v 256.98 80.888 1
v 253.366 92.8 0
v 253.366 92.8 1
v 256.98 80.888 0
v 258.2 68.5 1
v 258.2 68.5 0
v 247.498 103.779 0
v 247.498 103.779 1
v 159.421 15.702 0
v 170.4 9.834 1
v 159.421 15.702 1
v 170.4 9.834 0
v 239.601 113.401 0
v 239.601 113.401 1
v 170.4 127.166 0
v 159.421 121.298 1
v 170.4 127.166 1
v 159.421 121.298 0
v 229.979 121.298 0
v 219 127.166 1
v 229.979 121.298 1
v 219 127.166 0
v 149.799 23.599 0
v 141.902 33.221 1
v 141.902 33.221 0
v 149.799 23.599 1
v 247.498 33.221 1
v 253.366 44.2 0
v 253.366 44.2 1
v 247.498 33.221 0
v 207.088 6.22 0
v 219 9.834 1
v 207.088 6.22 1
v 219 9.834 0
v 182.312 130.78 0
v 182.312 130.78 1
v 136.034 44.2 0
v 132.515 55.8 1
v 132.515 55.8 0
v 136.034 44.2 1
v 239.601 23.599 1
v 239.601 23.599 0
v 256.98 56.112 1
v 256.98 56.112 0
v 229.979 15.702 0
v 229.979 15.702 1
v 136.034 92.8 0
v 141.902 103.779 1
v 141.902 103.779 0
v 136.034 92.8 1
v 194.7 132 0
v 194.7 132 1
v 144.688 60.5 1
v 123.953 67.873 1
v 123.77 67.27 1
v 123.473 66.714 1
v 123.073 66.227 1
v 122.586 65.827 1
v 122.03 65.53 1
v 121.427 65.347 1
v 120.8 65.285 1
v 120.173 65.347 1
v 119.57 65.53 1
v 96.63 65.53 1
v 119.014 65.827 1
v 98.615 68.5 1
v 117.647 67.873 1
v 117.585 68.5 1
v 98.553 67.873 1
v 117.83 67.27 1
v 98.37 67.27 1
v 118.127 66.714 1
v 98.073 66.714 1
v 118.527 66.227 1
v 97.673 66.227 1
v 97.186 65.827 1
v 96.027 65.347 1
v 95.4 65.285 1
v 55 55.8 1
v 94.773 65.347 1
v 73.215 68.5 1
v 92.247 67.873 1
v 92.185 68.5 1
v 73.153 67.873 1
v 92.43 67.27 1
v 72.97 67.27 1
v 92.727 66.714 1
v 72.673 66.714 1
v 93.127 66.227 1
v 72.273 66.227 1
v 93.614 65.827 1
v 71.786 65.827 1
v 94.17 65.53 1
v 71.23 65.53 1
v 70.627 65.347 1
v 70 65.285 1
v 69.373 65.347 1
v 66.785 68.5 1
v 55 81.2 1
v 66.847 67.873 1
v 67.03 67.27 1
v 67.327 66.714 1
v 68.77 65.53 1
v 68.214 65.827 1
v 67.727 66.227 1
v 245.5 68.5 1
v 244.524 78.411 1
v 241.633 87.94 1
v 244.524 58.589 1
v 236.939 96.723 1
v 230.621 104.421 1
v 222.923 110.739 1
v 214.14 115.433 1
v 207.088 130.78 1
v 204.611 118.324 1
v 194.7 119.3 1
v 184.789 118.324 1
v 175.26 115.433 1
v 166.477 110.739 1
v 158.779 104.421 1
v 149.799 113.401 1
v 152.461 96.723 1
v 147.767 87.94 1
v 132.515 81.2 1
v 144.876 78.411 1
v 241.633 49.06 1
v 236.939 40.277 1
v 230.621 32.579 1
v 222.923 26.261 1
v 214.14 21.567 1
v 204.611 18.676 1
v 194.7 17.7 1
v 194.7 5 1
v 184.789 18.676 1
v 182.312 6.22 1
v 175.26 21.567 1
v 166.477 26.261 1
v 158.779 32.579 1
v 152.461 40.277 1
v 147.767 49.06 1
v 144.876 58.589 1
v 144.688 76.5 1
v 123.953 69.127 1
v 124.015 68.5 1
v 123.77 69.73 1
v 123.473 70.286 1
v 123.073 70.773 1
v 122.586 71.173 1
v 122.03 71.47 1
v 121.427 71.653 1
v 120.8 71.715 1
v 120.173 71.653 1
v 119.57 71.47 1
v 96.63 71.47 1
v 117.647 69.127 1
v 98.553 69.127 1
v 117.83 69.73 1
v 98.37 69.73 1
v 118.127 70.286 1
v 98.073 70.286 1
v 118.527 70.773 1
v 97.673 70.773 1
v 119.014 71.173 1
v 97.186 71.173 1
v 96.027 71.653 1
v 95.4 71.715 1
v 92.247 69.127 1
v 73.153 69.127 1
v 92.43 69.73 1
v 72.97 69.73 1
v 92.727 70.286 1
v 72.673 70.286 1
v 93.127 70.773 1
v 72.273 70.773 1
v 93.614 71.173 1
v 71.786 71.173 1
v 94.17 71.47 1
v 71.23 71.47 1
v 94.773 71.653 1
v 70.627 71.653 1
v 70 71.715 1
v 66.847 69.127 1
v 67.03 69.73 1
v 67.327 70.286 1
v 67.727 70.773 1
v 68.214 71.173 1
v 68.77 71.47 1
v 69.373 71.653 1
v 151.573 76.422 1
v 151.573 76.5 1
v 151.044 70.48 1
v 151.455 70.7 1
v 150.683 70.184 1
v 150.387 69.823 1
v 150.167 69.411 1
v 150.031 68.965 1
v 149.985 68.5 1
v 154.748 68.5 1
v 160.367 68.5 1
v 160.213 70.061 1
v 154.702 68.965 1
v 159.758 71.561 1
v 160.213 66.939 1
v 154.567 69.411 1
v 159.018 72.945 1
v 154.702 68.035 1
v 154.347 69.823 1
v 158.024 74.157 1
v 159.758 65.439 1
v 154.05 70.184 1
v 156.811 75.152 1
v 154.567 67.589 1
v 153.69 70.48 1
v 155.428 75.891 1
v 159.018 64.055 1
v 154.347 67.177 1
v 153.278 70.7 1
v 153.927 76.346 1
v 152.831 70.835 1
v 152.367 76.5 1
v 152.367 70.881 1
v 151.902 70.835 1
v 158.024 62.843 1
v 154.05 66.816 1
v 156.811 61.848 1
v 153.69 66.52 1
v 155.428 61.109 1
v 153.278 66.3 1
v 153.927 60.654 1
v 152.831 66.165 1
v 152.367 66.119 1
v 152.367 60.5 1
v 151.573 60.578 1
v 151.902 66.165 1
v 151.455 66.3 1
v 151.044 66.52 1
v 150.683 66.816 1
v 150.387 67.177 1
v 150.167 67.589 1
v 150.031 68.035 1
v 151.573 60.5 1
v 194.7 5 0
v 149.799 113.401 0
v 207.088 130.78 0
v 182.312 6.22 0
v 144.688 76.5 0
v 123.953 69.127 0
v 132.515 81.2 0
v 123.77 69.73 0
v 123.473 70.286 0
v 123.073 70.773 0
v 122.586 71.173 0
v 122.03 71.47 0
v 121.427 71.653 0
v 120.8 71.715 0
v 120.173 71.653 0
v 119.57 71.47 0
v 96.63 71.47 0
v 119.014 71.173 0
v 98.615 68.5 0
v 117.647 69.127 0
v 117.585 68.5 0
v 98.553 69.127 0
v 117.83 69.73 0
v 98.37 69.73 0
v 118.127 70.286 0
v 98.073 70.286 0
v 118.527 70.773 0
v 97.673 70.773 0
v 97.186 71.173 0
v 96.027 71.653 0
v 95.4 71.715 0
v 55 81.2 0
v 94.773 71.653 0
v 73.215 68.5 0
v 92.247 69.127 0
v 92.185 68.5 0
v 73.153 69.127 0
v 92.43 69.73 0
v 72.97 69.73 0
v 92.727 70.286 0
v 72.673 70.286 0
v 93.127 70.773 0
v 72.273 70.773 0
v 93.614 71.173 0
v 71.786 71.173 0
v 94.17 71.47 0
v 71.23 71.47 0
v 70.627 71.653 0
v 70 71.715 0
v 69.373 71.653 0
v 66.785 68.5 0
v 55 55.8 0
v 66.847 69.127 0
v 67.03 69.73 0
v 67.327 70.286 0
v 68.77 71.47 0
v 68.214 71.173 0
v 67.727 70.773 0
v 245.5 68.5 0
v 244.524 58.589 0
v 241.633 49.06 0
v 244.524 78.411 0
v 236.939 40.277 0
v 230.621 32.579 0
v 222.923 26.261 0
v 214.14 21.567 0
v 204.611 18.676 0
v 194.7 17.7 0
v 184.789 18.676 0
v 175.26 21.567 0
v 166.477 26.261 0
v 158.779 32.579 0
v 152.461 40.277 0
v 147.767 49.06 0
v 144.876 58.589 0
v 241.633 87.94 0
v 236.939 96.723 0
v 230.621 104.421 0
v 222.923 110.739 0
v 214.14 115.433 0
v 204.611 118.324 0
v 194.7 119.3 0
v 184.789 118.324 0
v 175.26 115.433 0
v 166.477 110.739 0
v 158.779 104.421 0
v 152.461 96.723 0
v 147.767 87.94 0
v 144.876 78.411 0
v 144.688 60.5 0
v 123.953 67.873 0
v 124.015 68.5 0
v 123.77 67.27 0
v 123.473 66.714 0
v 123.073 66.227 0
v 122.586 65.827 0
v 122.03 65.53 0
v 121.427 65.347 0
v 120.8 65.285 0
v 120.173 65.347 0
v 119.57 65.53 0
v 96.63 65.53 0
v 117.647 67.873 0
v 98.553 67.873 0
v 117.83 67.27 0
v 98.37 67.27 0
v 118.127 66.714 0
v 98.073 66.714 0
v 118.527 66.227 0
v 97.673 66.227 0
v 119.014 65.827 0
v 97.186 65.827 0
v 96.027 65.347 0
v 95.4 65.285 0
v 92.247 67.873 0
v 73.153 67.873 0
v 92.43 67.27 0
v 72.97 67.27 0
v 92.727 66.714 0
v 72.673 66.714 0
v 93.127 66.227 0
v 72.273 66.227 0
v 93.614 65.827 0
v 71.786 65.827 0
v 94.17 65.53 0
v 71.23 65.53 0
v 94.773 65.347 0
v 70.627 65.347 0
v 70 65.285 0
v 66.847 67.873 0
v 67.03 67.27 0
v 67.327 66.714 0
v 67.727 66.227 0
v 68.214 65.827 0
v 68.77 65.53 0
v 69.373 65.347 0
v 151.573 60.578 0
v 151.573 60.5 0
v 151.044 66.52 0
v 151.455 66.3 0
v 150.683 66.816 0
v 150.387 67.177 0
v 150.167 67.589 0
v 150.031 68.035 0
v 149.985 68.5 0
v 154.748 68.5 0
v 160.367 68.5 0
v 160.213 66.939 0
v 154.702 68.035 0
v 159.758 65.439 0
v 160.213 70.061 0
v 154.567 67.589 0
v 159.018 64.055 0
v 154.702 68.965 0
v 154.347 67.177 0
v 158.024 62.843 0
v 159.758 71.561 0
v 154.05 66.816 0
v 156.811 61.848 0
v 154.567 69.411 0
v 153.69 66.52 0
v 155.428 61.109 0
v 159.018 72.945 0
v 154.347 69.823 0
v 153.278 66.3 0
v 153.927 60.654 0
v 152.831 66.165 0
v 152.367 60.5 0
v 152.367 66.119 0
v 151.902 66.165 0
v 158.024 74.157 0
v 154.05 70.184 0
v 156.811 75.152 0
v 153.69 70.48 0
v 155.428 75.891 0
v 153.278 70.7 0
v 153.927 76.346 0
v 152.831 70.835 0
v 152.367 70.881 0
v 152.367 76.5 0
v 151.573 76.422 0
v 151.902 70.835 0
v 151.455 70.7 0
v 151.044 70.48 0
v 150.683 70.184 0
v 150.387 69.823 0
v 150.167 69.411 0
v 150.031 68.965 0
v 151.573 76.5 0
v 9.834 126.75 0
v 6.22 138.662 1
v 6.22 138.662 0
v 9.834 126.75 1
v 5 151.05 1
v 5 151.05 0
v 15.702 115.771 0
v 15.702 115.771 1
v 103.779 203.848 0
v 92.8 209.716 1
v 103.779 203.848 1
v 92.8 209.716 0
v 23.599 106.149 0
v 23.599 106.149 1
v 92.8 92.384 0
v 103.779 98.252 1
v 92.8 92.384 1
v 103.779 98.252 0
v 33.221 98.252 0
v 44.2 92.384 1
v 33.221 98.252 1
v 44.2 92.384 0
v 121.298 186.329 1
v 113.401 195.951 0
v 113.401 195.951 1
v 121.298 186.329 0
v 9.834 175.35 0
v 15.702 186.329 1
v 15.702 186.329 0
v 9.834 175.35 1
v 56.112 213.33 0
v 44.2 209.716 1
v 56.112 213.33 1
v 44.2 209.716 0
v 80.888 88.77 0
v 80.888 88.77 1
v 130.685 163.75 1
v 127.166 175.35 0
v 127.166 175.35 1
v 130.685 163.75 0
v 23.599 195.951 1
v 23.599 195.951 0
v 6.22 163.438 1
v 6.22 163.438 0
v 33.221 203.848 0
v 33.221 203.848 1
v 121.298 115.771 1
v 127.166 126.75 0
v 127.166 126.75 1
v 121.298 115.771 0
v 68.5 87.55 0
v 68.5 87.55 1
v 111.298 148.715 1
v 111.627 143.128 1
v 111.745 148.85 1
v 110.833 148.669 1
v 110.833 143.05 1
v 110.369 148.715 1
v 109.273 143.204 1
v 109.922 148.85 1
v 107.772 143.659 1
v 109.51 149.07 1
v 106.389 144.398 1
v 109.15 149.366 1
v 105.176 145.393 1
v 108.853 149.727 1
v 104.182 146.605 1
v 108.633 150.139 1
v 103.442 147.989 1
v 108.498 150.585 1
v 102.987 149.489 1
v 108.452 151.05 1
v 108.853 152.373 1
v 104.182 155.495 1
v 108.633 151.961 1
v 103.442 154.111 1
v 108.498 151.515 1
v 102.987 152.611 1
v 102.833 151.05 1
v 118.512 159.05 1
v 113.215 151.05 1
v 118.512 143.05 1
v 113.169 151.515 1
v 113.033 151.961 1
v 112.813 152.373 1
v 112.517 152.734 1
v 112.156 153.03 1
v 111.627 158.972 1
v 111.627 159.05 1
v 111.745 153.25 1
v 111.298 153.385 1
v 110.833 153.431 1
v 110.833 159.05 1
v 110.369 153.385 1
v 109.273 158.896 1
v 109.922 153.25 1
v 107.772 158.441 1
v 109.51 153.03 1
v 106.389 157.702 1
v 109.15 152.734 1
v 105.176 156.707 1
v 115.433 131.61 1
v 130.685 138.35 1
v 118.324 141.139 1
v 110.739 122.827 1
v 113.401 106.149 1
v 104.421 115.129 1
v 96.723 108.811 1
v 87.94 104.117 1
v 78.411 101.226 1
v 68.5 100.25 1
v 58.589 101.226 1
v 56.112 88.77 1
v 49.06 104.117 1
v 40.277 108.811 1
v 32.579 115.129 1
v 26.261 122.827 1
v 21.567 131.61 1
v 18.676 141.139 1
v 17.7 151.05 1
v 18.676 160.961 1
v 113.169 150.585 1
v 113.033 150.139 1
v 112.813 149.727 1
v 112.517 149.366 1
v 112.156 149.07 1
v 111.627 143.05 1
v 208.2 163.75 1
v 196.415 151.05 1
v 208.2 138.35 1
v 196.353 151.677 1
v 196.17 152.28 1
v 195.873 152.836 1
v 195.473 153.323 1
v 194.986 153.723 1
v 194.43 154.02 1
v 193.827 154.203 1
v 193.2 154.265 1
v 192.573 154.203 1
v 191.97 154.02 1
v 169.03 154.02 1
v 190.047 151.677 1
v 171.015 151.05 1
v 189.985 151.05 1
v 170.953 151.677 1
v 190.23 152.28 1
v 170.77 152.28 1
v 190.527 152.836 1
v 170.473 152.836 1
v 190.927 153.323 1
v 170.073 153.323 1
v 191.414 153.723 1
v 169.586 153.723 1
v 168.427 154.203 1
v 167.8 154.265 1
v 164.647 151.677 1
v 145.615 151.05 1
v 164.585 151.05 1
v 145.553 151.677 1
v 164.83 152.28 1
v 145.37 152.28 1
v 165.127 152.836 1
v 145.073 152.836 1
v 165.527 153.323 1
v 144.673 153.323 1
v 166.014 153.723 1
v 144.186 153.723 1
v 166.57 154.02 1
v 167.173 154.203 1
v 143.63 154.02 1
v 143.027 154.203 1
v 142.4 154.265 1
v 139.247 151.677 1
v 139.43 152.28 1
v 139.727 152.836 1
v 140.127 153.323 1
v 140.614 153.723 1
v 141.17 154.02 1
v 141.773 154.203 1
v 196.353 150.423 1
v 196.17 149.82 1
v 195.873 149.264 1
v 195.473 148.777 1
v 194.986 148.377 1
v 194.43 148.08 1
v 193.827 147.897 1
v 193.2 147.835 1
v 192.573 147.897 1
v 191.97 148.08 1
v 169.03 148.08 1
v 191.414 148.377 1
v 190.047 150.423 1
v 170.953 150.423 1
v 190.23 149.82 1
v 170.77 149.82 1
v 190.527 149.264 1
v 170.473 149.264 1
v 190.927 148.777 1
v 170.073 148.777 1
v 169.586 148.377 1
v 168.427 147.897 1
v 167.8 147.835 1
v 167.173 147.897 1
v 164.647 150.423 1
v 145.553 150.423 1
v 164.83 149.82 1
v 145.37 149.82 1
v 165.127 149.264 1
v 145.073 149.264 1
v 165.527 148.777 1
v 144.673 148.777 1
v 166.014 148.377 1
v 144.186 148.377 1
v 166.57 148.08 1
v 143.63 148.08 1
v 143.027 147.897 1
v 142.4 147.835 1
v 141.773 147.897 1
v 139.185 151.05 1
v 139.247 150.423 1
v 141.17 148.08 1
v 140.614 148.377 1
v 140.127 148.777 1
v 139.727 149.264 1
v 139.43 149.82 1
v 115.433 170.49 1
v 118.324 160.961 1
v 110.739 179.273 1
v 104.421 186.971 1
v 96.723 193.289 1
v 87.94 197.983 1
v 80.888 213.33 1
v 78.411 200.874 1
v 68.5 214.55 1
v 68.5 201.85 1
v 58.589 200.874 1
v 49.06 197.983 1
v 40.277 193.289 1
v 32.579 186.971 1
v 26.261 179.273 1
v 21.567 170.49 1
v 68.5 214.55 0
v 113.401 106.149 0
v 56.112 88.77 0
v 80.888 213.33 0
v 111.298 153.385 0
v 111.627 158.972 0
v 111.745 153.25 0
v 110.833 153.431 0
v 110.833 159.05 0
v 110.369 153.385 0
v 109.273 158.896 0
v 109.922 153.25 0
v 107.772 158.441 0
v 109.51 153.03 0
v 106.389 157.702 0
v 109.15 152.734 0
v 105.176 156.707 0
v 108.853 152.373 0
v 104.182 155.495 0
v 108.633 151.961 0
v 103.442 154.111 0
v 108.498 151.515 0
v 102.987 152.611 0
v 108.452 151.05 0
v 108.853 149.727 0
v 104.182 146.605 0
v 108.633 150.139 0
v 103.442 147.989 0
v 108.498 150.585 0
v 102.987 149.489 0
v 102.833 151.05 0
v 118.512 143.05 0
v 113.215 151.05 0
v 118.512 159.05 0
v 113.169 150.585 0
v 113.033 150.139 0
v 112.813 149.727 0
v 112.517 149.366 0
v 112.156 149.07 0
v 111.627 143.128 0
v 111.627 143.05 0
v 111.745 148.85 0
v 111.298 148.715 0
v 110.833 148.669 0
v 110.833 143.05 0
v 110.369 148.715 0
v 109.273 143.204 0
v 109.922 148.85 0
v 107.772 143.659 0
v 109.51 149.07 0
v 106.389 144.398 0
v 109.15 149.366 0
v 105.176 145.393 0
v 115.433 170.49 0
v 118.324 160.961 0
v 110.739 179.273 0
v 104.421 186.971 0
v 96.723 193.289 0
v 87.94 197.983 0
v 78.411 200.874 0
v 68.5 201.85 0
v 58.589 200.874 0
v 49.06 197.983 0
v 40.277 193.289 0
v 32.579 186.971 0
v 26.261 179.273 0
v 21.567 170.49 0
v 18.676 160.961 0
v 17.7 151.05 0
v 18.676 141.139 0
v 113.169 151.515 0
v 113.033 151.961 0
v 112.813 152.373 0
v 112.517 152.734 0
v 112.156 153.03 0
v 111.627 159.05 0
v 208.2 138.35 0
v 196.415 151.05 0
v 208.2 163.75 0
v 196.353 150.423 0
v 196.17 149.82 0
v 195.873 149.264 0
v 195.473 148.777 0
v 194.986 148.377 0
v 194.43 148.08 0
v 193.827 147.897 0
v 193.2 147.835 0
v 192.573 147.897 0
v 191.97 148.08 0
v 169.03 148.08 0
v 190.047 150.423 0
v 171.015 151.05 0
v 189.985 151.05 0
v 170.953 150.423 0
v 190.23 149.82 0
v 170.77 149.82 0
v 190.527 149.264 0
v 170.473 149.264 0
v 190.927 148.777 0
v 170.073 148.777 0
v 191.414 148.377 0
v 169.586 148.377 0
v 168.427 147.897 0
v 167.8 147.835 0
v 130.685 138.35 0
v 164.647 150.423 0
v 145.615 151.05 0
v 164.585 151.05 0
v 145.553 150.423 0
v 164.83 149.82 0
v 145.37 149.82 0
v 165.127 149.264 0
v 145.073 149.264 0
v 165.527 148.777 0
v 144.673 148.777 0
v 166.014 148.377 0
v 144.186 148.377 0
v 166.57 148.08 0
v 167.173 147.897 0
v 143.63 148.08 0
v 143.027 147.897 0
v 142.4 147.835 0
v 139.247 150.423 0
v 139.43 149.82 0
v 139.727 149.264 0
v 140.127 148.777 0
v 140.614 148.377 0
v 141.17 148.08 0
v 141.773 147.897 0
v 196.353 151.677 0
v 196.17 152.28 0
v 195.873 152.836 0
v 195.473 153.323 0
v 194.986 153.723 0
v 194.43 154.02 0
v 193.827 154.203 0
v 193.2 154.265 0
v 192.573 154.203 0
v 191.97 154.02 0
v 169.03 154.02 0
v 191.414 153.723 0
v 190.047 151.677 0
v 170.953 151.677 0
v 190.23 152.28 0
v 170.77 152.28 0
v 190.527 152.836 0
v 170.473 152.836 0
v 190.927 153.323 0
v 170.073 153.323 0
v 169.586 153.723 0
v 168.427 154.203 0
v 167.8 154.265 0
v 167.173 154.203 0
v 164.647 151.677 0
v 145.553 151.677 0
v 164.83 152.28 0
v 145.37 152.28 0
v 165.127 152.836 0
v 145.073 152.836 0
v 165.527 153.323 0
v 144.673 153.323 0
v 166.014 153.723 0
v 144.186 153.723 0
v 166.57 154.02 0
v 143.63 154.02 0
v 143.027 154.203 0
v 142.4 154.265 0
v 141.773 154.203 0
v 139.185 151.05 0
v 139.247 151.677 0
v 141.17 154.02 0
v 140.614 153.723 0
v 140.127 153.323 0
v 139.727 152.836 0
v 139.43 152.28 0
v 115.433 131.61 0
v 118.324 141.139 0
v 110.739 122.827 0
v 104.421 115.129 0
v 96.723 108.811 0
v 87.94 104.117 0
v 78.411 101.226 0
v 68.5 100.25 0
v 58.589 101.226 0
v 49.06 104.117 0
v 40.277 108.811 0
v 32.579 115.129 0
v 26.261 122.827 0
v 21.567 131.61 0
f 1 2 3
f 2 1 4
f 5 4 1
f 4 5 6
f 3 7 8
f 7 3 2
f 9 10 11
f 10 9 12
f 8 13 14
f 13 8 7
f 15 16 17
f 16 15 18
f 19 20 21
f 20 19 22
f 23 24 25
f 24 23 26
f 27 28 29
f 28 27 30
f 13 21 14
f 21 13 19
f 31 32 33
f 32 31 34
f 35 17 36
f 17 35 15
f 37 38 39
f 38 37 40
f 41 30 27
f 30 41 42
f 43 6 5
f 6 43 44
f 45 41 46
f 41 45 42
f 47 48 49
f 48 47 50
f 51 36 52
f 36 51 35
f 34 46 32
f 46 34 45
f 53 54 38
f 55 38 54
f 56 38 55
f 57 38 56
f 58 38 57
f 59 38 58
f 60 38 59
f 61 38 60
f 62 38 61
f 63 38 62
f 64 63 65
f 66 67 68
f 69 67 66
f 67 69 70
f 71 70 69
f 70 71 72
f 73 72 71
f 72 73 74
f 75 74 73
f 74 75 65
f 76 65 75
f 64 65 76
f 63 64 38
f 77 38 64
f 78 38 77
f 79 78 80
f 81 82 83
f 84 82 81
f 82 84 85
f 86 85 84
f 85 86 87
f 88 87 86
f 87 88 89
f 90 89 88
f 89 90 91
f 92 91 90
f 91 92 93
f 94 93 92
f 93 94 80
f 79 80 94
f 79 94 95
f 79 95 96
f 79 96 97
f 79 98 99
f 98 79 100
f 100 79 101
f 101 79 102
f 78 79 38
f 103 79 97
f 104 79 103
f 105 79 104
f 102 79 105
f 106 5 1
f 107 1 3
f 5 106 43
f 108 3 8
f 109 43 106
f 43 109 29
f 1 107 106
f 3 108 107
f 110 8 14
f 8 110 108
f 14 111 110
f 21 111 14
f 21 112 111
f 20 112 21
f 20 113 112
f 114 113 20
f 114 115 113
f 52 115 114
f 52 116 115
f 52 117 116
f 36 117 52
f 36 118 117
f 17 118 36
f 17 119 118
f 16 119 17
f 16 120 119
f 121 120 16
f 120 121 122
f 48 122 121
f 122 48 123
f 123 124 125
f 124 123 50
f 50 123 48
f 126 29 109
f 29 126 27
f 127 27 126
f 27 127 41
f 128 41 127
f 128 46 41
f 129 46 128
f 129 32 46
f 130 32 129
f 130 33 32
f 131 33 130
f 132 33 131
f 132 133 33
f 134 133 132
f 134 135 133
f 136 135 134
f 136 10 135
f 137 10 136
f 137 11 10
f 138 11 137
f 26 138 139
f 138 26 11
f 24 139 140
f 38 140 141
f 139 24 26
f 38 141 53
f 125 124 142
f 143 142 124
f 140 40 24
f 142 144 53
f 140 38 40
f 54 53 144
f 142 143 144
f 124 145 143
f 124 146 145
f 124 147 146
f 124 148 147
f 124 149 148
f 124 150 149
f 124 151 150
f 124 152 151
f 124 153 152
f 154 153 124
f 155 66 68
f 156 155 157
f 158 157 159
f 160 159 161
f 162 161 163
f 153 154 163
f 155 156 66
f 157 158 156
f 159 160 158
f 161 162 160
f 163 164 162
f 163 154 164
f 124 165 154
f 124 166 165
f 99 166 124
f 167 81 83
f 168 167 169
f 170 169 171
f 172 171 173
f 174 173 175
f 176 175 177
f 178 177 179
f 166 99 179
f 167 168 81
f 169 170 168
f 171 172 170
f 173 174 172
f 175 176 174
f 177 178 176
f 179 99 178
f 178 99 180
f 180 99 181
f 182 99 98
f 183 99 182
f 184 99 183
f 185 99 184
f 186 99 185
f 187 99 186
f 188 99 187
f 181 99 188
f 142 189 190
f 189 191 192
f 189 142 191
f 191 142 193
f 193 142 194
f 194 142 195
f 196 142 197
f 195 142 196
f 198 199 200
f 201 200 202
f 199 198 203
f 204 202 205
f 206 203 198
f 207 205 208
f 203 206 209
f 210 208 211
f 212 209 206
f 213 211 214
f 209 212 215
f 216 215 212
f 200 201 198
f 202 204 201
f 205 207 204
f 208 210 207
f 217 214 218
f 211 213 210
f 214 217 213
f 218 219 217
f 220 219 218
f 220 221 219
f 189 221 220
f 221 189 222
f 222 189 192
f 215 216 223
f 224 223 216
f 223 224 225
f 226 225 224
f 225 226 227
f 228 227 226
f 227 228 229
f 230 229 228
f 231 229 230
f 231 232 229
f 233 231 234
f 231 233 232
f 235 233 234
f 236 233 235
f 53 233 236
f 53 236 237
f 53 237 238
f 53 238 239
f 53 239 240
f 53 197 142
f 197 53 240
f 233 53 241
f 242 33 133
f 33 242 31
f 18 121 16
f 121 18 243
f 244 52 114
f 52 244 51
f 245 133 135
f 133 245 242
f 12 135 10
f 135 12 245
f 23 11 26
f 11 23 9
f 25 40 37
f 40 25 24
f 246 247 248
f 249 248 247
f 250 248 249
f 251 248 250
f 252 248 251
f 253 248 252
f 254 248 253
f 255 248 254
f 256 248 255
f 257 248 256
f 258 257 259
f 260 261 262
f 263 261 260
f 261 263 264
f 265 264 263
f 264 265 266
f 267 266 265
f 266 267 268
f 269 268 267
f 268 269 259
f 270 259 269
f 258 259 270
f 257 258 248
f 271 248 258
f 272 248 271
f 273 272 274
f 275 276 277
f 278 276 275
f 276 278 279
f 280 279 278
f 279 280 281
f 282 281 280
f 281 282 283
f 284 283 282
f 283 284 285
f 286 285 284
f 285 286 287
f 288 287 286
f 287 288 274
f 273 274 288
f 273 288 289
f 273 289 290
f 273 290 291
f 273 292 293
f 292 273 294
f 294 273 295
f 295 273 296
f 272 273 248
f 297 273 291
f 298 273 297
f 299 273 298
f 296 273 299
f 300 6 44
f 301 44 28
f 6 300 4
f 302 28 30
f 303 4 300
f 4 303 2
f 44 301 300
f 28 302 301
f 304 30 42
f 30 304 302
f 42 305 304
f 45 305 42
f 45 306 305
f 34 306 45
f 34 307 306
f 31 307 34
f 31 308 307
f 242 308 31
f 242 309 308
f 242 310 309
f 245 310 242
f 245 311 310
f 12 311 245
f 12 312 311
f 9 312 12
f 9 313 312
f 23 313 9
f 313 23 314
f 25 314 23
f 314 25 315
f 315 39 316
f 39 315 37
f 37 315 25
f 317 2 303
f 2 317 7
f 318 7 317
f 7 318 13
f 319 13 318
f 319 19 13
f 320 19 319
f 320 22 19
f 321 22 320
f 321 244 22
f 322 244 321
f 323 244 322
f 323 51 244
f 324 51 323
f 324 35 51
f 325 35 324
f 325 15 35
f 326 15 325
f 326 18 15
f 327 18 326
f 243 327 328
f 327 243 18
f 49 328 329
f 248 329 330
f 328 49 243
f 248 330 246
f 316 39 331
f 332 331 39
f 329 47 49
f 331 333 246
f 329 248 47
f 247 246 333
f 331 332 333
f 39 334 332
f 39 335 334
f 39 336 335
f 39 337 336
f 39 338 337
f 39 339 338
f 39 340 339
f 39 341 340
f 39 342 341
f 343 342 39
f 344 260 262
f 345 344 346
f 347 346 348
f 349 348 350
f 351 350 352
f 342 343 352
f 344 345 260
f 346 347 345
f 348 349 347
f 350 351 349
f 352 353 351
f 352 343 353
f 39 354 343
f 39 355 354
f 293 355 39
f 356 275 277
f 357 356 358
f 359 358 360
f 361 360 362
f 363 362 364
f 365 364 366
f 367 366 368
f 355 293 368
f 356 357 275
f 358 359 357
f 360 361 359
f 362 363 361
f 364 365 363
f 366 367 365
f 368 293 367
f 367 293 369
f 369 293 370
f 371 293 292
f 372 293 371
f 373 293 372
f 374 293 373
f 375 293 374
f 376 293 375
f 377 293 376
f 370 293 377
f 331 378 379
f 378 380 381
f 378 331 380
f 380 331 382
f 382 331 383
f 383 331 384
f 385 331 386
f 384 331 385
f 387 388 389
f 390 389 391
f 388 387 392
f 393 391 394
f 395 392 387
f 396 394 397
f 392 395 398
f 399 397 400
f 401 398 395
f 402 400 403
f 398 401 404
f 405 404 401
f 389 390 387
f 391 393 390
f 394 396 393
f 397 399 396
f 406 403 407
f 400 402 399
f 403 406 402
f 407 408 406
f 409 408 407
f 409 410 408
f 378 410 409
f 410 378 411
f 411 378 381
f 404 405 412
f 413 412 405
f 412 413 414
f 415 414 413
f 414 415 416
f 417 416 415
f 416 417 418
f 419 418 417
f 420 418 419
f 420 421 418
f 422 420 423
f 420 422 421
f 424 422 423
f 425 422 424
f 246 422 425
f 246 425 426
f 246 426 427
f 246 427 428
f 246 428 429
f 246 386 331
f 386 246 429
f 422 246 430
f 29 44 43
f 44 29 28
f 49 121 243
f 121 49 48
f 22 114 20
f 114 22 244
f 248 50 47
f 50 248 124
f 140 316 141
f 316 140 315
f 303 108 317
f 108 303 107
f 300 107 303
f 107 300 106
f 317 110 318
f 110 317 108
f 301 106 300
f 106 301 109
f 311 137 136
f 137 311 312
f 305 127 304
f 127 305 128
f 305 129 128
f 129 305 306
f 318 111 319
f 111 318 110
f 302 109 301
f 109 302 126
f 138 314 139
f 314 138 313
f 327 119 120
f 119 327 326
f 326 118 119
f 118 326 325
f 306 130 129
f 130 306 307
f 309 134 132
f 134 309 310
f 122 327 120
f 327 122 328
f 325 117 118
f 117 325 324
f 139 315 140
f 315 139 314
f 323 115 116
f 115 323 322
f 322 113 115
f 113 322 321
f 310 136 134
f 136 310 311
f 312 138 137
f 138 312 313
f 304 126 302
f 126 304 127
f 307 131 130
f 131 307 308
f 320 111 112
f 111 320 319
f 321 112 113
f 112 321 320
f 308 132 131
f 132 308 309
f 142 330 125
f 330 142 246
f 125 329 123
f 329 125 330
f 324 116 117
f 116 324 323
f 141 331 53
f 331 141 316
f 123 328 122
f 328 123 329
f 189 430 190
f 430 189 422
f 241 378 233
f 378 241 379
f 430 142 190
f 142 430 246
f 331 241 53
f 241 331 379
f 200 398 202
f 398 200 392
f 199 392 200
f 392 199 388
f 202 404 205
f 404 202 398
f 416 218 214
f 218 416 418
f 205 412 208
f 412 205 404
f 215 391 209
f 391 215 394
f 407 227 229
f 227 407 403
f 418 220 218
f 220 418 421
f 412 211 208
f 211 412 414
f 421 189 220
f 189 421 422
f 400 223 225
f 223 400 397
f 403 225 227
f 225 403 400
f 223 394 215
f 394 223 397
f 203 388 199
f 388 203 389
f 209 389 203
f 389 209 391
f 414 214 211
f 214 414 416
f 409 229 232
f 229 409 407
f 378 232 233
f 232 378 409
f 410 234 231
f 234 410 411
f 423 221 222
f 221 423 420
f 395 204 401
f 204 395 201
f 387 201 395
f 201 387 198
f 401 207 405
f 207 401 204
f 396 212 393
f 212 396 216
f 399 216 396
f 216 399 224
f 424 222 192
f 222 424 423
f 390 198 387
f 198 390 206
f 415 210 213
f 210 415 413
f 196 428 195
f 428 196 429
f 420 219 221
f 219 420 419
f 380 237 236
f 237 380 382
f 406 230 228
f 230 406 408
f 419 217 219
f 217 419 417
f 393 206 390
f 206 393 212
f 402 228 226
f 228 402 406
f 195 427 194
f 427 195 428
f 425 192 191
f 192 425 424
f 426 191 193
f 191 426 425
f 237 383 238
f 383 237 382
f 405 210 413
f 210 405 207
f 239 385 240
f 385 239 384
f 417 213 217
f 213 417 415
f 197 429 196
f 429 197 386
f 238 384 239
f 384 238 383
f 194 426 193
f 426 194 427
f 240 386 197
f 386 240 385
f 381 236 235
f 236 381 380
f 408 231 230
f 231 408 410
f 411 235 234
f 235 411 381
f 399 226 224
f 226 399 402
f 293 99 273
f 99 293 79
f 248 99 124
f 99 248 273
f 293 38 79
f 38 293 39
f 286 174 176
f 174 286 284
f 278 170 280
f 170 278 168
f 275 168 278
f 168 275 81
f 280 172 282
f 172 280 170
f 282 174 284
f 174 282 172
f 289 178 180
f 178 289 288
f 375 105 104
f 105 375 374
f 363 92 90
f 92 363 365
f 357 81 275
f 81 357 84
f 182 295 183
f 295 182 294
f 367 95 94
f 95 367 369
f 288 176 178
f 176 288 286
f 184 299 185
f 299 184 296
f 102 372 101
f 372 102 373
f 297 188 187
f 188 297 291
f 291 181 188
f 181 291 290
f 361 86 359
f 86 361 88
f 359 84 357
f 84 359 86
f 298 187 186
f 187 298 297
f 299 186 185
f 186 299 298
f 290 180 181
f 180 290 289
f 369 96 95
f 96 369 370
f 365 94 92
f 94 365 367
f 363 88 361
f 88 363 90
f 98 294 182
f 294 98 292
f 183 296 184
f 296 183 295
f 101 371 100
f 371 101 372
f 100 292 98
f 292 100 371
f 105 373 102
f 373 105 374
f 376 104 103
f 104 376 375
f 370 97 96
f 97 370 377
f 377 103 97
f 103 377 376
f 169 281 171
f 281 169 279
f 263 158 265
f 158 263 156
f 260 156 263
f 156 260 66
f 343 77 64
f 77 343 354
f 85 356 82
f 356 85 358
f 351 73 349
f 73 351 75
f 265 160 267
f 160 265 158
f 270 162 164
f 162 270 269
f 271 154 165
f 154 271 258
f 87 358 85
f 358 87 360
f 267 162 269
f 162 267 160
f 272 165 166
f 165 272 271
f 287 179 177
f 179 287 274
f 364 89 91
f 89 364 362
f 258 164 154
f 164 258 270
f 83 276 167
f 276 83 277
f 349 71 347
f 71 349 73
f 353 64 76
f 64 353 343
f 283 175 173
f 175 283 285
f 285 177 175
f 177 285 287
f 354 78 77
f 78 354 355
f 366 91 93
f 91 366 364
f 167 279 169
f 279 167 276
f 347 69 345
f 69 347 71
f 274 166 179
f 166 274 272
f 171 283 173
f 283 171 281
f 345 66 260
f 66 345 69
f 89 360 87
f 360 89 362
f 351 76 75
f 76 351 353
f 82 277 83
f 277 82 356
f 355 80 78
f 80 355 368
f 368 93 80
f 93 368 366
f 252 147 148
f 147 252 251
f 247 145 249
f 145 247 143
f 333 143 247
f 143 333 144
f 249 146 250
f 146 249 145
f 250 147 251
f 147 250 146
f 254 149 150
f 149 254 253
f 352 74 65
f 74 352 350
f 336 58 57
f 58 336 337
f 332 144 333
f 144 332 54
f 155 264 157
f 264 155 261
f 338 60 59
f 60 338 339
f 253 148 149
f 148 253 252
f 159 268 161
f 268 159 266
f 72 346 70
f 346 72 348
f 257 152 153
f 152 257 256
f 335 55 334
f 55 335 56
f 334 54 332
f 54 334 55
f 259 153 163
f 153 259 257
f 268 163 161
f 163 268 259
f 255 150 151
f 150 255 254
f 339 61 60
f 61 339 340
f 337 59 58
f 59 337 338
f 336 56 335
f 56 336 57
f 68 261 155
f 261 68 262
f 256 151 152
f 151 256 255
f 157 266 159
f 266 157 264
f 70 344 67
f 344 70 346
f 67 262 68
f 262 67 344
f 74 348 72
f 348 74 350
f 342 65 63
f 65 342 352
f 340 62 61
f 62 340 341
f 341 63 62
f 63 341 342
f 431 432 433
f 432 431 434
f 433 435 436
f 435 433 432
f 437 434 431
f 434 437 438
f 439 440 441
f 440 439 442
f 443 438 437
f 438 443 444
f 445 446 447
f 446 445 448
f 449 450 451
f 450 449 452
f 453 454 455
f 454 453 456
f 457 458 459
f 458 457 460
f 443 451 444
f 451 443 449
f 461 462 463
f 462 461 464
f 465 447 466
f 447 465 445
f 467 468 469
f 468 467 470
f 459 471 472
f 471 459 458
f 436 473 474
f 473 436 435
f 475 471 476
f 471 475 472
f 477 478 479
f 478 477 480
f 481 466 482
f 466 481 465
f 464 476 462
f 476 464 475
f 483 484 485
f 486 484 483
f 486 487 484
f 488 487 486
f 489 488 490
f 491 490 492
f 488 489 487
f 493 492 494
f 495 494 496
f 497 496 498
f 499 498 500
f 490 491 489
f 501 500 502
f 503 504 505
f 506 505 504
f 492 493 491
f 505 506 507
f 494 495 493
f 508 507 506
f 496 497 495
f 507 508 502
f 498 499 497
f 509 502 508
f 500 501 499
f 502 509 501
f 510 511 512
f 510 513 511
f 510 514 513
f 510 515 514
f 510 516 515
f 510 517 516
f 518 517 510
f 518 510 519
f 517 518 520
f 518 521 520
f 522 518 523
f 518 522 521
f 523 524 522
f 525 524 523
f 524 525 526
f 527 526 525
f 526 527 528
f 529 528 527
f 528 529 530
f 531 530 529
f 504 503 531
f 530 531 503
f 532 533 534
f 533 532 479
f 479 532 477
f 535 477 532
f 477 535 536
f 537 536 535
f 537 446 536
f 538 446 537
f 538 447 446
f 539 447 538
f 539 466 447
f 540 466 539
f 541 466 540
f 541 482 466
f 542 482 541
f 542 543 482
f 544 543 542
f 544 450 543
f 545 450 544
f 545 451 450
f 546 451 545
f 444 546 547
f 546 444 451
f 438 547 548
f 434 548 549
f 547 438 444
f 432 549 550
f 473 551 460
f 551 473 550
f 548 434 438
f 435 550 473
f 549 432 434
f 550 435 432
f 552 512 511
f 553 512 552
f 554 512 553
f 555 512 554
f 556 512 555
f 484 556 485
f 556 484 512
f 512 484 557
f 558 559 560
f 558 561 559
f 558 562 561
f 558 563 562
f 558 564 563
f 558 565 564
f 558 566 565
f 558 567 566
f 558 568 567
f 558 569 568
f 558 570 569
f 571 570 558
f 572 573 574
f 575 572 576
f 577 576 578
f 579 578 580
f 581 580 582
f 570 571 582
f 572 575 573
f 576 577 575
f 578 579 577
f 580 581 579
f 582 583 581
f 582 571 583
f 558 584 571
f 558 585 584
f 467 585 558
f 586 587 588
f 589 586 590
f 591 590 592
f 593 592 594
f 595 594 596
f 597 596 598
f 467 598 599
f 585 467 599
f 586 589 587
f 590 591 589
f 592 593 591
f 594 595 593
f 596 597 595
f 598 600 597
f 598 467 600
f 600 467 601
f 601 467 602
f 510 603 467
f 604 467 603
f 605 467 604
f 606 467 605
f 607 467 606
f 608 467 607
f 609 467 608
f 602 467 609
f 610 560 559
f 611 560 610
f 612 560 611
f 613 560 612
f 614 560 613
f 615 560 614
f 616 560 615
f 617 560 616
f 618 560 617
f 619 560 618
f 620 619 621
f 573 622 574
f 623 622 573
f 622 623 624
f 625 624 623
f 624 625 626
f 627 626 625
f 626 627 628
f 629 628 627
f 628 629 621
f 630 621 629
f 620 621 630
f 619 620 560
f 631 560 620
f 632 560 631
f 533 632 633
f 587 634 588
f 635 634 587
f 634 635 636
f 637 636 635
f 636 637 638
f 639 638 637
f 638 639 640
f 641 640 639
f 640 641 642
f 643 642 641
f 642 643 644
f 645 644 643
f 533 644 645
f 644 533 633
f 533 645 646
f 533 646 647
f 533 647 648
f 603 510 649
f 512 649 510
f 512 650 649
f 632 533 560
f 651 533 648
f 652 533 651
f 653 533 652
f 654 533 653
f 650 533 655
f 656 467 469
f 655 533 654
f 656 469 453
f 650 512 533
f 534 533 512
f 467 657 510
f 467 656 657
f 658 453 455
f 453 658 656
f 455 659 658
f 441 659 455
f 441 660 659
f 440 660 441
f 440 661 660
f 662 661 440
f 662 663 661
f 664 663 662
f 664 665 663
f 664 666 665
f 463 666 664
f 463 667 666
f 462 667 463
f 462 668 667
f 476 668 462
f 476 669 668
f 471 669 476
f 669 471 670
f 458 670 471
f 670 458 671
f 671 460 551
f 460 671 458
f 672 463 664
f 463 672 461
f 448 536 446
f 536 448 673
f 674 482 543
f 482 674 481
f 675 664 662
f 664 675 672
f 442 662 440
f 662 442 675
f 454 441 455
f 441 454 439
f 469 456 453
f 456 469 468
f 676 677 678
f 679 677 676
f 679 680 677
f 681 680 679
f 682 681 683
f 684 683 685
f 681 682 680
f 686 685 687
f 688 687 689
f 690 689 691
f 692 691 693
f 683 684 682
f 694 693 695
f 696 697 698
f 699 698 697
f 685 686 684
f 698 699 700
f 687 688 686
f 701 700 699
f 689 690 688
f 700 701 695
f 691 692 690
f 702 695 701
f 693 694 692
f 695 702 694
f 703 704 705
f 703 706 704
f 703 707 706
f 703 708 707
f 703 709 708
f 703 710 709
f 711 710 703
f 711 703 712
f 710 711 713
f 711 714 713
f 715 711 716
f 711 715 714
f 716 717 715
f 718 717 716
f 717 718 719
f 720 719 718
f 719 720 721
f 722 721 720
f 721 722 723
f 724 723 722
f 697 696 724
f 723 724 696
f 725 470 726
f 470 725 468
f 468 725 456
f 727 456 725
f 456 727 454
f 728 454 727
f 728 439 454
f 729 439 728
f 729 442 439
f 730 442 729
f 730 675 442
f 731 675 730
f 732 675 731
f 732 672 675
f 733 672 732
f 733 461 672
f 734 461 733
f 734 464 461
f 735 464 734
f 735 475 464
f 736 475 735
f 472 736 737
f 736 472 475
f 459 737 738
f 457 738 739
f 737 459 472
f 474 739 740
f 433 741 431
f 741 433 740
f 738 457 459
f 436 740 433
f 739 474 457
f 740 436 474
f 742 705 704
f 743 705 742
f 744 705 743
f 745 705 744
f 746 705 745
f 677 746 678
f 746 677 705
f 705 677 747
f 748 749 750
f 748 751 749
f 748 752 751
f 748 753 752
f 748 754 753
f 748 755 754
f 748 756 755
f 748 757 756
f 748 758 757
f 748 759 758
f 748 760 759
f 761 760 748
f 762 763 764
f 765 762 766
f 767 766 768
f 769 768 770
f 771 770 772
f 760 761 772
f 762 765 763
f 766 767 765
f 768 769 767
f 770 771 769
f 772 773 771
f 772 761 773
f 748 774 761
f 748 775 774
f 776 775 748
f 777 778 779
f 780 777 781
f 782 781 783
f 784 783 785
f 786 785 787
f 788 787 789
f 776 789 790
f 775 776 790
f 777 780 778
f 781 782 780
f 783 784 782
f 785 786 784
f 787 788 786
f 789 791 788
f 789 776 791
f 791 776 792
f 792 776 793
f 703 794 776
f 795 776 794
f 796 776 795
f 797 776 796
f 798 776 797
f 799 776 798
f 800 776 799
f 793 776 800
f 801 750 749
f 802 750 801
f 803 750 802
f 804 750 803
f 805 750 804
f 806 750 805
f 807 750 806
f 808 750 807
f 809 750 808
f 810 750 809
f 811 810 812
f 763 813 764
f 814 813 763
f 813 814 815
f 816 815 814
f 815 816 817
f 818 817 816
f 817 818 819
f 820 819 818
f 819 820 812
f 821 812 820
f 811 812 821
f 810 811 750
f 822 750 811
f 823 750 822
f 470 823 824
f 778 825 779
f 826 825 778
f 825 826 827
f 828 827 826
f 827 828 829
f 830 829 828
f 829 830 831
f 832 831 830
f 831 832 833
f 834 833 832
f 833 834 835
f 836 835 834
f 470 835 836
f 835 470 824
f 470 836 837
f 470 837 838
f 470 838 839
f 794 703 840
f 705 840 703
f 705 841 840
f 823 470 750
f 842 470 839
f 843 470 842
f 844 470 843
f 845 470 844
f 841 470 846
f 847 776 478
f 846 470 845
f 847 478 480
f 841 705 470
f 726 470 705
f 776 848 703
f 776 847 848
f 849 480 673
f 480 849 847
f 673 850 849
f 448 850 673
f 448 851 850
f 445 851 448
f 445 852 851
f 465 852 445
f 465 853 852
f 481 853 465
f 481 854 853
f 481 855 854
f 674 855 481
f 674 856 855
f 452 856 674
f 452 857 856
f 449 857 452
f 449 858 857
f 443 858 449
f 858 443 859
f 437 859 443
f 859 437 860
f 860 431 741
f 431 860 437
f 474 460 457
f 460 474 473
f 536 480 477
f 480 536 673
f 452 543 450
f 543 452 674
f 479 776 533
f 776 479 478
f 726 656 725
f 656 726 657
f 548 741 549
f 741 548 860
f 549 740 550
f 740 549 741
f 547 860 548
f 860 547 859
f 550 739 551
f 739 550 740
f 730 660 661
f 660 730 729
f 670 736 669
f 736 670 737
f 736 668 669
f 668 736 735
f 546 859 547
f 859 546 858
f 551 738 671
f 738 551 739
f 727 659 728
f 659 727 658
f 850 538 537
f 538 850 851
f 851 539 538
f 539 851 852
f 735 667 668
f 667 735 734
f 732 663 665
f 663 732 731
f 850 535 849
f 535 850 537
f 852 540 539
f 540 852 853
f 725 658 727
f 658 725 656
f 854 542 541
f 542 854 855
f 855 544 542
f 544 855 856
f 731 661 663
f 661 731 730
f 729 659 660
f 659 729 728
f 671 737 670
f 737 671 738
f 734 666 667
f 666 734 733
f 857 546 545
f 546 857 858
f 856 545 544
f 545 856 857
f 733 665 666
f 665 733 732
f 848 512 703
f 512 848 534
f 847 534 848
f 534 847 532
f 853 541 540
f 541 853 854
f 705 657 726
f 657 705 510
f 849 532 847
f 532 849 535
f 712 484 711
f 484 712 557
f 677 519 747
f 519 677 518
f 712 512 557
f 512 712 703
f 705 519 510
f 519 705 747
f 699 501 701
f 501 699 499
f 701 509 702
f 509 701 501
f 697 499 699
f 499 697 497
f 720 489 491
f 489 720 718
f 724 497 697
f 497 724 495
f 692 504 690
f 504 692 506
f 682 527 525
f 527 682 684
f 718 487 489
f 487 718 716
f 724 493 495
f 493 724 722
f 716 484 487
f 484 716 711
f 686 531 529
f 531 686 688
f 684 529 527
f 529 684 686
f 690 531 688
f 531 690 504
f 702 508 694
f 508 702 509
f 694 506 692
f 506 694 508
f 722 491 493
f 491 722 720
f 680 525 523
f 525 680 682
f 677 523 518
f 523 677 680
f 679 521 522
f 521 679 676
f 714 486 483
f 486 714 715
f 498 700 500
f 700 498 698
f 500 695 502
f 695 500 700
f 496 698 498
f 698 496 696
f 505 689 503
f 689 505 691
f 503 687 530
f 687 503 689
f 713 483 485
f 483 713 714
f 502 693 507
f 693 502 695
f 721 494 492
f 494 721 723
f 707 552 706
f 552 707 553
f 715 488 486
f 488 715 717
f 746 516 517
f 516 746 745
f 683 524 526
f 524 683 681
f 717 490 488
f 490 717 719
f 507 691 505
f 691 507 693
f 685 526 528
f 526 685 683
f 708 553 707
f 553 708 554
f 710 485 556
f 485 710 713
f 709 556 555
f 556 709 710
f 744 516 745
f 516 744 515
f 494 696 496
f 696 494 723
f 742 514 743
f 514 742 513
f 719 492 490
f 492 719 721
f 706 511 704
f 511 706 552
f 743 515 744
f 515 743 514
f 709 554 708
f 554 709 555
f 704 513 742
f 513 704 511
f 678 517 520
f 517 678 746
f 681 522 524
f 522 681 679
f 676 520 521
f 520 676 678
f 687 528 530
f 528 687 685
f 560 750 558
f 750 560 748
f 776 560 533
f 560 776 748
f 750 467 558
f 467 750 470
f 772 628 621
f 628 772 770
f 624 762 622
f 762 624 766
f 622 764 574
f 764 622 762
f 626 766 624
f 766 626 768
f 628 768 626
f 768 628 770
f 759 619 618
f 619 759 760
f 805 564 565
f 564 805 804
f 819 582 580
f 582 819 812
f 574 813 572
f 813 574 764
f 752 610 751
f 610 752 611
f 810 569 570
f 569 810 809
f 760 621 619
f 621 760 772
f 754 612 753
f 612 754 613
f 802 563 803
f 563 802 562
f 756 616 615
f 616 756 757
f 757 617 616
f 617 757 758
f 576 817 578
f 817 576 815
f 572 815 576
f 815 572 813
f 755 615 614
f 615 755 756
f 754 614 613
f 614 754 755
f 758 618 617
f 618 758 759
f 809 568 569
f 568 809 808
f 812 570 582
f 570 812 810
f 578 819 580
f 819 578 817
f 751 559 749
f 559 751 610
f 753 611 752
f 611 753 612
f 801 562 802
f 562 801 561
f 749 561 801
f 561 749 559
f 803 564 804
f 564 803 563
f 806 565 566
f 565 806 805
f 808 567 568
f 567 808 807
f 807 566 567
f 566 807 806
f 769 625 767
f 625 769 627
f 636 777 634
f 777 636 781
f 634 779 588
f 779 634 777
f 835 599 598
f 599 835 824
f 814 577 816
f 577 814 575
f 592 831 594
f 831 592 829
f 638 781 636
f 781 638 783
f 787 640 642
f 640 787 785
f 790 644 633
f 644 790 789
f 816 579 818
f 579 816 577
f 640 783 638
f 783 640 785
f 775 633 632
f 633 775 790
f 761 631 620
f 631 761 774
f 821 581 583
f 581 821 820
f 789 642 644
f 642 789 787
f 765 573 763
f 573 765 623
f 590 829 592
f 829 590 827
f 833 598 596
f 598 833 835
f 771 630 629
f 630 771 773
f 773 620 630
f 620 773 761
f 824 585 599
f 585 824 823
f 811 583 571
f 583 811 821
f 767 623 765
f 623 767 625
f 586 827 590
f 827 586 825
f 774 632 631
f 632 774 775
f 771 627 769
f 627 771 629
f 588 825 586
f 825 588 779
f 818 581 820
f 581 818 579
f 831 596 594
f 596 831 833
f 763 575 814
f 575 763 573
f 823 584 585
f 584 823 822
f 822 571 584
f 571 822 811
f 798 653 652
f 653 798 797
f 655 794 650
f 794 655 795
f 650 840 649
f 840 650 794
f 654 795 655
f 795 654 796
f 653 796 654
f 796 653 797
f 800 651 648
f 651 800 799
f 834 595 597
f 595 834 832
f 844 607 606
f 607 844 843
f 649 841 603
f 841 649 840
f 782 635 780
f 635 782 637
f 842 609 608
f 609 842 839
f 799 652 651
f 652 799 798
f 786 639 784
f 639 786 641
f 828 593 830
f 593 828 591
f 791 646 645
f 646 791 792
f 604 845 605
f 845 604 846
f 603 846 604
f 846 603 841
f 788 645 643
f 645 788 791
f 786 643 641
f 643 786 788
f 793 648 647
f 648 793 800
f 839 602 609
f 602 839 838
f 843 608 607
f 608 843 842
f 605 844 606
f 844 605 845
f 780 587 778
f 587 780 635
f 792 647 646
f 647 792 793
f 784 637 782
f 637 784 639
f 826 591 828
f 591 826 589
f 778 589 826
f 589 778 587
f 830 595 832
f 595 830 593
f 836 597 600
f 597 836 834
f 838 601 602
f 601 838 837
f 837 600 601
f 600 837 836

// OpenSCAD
// golf ball drop for CCR


$inch=25.4;
$paddle_rad=(2.5*$inch);
$paddle_hollow_rad=($paddle_rad - (0.5*$inch));
$div_long=($paddle_rad-(0.5*$inch));
$div_wide=($paddle_rad/5);
$plat_rad=(8);
$height=1;
$t_hole=($inch/2 * 3/16);

$clamp_wide=$inch*1;
$clamp_len=$inch*3;

$fn=32;

module handle() {
    difference() {
        translate([0,-($clamp_wide/2),0]) {
            cube([$clamp_len*1.1, $clamp_wide,$height]);
        }
        translate([15,0,-1]) {
            cylinder(r=$inch/7.9, h=$height+2);
        }
        translate([15+$inch,0,-1]) {
            cylinder(r=$inch/7.9, h=$height+2);
        }   
        translate([15+2*$inch,0,-1]) {
            cylinder(r=$inch/7.9, h=$height+2);
        }       
    }
}

module hollow_paddle() {
    translate([$paddle_rad,0,0]) {
        difference() {
            cylinder(r=$paddle_rad, h=$height);
            translate([0,0,-1]) {
                cylinder(r=$paddle_hollow_rad, h=$height+2); 
            }
        }
    }
}

module diving_board() {
    difference() {
        union() {
            translate([0,-($plat_rad),0]) {
                cube([($paddle_rad-$t_hole)/3, $plat_rad*2, $height]);
            }
            translate([$paddle_rad/3, 0, 0]) {
                cylinder(r=$plat_rad, h=$height);
            }
        }
        translate([$paddle_rad/3,0,-1]) {
            cylinder(r=$t_hole, h=$height+2);
        }
    }
}

module build_tip() {
    union() {
        hollow_paddle();
        diving_board();
    }  
}

module build_it() {
    //cube([110,2,10]);
    union() {
        translate([$clamp_len,0,0]) {
            build_tip();
        }
        handle();
    }
}

//--------------------------------------------------
$2d=0;

if ($2d) {
    projection(cut=true) {
       translate([50,$paddle_rad,0]) rotate([0,0,0]) {
          build_it();
       }
       translate([($clamp_len+2*$paddle_rad),$paddle_rad * 2.3,0]) rotate([0,0,180]) {
          build_it();
       }
/*
	   translate([50,$paddle_rad * 1.6*2.3,0]) rotate([0,0,0]) {
	      build_it();
	   } 
*/
    }
} else {
   translate([55,$paddle_rad+5,0]) rotate([0,0,0]) {
      build_it();
   }
   translate([($clamp_len+2*$paddle_rad)+5,$paddle_rad * 2.3+5,0]) rotate([0,0,180]) {
      build_it();
   }  /*
   translate([50,$paddle_rad * 1.6*2.3,0]) rotate([0,0,0]) {
      build_it();
   } */ 
}
